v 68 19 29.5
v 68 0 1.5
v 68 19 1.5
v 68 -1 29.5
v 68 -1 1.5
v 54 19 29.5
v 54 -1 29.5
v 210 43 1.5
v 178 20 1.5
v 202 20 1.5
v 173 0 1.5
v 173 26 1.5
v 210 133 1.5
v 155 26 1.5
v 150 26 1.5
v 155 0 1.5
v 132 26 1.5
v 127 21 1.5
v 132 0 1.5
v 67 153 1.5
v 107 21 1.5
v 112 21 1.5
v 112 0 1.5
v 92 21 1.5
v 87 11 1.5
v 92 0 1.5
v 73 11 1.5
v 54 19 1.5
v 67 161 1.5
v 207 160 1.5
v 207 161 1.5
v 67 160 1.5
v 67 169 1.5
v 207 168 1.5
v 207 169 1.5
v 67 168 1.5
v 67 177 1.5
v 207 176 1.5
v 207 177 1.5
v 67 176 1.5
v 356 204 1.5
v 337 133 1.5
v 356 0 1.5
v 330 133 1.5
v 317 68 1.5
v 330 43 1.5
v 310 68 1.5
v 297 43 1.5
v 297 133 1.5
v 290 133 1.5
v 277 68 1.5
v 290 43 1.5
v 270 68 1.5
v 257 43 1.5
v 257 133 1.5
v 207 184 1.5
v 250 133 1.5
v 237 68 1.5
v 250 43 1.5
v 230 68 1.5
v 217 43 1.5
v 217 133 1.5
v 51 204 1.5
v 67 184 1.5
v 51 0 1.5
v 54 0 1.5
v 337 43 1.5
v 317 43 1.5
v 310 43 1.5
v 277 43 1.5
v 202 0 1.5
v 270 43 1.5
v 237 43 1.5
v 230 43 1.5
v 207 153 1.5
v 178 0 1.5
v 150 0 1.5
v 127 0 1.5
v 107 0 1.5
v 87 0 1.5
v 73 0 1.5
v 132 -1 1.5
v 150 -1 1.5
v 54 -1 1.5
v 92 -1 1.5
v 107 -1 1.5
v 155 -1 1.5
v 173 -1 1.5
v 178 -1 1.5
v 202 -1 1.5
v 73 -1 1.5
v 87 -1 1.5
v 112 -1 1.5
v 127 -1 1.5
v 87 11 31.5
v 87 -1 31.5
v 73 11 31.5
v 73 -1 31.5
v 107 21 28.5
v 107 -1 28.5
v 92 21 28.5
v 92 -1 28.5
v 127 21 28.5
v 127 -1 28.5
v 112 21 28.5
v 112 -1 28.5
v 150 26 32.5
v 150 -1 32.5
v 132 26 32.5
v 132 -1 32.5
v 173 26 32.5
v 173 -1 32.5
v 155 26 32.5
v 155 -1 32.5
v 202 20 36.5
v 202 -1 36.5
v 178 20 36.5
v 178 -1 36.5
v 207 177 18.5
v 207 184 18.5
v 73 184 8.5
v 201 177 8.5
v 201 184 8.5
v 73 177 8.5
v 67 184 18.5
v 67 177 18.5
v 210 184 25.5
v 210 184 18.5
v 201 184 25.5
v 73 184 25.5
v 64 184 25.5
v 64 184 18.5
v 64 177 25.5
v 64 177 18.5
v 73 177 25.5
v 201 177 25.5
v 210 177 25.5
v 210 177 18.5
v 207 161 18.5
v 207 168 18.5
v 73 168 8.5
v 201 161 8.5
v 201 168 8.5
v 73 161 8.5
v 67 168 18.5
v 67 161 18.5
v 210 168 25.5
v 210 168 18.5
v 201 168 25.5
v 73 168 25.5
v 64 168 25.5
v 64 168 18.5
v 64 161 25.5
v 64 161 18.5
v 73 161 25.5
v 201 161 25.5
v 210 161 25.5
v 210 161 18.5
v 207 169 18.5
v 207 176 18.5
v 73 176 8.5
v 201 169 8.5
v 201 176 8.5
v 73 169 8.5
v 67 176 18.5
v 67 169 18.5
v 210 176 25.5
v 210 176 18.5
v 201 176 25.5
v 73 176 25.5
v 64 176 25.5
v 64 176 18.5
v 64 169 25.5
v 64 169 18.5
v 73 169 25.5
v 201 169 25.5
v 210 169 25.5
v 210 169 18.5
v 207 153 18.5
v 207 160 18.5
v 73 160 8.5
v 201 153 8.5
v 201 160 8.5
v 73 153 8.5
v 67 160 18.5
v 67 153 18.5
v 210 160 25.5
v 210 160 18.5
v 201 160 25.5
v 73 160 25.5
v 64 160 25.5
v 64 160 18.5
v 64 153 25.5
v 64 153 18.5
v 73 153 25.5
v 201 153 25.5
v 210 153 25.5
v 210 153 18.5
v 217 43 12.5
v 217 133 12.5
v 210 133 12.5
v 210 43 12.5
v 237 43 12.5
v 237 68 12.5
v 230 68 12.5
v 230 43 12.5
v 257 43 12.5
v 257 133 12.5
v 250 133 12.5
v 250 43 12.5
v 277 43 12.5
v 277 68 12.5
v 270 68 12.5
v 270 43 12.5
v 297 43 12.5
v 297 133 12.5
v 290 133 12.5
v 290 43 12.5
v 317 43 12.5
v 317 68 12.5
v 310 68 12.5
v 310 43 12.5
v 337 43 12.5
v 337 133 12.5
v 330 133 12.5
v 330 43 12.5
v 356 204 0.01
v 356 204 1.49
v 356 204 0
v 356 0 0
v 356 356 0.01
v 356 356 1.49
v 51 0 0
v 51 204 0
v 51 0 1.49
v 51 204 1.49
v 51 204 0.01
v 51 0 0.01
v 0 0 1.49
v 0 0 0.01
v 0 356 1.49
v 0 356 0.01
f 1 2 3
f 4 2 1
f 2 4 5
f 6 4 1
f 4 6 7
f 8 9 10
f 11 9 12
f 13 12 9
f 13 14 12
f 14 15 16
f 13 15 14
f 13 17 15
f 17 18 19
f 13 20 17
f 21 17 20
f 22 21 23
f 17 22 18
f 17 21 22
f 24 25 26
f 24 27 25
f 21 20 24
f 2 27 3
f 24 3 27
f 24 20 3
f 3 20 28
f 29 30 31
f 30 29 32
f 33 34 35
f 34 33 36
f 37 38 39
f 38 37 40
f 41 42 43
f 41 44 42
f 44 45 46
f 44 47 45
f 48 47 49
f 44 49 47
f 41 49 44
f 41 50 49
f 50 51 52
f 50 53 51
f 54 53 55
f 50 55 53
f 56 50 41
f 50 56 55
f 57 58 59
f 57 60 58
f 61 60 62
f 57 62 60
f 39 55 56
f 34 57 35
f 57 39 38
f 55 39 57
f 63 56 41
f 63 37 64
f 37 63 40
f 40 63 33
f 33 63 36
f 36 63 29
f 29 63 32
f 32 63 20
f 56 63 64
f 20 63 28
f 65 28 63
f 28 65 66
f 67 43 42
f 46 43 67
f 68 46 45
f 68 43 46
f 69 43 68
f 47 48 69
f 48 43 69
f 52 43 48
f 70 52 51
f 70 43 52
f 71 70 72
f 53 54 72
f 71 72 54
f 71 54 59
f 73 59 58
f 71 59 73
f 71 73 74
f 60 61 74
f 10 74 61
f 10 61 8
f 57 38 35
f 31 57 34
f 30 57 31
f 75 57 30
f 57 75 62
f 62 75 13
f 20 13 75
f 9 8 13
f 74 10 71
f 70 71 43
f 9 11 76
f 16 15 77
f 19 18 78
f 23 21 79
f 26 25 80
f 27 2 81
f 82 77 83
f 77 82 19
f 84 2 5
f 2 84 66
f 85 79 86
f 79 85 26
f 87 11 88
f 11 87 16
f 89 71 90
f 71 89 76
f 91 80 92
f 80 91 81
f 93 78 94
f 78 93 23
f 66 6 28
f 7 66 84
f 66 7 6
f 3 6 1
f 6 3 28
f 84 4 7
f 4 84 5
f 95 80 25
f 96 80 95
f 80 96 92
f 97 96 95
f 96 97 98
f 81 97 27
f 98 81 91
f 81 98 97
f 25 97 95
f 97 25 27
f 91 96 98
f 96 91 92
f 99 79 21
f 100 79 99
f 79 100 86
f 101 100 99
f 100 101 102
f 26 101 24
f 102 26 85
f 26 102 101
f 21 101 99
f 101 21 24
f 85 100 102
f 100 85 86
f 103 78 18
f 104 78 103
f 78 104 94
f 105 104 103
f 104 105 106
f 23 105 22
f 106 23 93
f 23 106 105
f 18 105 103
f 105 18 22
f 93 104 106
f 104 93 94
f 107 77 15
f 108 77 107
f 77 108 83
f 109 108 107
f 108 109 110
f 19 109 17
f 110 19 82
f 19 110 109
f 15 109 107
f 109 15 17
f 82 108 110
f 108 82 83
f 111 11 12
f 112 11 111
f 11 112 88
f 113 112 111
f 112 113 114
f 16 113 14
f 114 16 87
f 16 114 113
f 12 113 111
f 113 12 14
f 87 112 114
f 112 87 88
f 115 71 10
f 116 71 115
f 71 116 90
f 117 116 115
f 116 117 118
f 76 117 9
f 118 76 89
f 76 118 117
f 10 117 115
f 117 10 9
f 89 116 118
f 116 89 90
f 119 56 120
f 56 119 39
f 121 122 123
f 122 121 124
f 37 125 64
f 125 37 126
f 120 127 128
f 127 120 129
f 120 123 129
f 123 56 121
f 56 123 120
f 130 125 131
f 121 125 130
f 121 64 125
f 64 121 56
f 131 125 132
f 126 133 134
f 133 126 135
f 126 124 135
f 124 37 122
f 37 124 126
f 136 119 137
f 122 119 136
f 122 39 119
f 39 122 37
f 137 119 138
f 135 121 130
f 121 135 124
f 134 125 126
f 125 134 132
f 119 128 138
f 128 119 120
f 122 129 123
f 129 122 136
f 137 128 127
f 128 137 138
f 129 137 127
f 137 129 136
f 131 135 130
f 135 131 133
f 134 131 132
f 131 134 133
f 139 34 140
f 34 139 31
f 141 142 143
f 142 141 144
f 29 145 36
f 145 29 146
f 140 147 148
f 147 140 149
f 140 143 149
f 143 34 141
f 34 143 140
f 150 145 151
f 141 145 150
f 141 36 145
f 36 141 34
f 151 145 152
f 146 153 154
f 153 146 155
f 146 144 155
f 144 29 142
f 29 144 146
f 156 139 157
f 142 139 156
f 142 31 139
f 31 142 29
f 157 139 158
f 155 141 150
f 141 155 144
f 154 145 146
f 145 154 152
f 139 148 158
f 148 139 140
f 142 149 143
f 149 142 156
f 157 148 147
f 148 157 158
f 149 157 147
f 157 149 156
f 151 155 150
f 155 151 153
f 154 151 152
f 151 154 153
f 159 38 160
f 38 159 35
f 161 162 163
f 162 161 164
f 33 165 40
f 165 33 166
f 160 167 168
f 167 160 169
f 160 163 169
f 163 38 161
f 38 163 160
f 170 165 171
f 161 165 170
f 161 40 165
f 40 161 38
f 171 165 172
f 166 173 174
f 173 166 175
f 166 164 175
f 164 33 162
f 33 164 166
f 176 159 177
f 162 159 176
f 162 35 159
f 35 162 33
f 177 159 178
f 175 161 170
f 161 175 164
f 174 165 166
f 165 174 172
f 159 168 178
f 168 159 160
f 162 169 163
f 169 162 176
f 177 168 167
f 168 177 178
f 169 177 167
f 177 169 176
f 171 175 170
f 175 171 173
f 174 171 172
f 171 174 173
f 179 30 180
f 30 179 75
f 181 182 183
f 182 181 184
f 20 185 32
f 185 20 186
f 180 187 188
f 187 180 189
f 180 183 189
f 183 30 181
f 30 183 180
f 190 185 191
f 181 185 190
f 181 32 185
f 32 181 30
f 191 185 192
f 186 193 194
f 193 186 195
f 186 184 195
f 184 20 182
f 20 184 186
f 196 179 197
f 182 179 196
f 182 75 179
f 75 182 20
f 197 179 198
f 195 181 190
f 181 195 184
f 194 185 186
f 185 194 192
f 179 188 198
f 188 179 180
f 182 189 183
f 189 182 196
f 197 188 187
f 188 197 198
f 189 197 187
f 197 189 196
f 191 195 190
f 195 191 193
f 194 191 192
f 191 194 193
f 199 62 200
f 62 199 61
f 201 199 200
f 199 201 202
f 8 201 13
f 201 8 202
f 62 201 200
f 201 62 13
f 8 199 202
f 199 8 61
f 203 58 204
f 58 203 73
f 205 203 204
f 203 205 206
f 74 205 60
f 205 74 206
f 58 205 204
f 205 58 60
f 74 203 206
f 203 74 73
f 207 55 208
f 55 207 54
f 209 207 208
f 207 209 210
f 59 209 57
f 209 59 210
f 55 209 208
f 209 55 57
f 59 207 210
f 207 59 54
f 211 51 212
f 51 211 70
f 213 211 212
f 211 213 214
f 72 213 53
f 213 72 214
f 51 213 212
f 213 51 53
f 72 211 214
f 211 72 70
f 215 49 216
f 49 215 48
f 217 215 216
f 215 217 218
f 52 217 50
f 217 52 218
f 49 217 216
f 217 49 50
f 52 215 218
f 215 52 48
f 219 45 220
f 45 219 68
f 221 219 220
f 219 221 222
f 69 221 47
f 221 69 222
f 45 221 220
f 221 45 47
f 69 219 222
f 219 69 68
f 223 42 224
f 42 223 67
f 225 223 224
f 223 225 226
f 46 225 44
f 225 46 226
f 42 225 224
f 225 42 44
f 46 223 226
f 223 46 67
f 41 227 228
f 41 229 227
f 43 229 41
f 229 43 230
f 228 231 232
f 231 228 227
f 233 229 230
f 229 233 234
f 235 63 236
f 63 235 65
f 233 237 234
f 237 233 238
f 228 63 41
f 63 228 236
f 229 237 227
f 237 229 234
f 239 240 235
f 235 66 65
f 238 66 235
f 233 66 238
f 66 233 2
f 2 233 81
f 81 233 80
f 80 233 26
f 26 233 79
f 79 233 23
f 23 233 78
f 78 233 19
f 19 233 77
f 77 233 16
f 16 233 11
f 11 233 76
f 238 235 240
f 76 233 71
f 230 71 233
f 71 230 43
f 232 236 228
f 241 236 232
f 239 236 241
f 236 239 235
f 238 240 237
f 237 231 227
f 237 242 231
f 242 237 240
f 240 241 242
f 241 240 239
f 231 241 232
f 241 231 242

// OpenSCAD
// ATX motherboard.

// Constants:
OX = 0.01;
pcbX = 305;
pcbY = 204;
pcbZ = 1.5;
wtxX = 356;
wtxY = 356;
ramX = 140;
ramY = 7;
ramZ = 7;

// Colors:
pcbColor = [56/255, 107/255, 172/255];
wtxColor = [100/255, 100/255, 255/255, 0.3];
metalColor = [255/255, 255/255, 255/255];
ram1Color = [238/255, 51/255, 41/255];
ram2Color = [252/255, 224/255, 57/255];
darkColor = [64/255, 64/255, 64/255];

// Modules:
module ramSlot(baseColor) {
    color(baseColor) {
        cube([140, ramY, ramZ]);
        cube([6, ramY, 17]);
        translate([ramX - 6, 0, 0]) cube([6, ramY, 17]);
    }
    color(metalColor) {
        translate([ramX - 6, 0, 17]) cube([9, ramY, 7]);
    }
    color(metalColor) {
        translate([-3, 0, 17]) cube([9, ramY, 7]);
    }
}

module pcie1() {
    color(darkColor) cube([ramY, 25, 11]);
}

module pcie16() {
    color(darkColor) cube([ramY, 90, 11]);
}

module motherboard() {
    // PCB:
	translate([wtxX - pcbX, 0, 0]) {
		color(pcbColor) cube([pcbX, pcbY, pcbZ]);
		translate([0, 0, pcbZ]) { // Place on board.

		// Periphery:
		color(metalColor) {
			translate([3, -1, 0]) {
				cube([14, 20, 28]);
				translate([14+5, 0, 0]) cube([14, 12, 30]);
				translate([(19)+14+5, 0, 0]) cube([15, 22, 27]);
				translate([(38)+15+5, 0, 0]) cube([15, 22, 27]);
				translate([(58)+15+5, 0, 0]) cube([18, 27, 31]);
				translate([(78)+18+5, 0, 0]) cube([18, 27, 31]);
				translate([(101)+18+5, 0, 0]) cube([24, 21, 35]);
			}
		}

		// RAM:
		translate([16, pcbY - 27, 0]) ramSlot(ram1Color);
		translate([16, pcbY - 27 - 2 * (ramY + 1), 0]) ramSlot(ram1Color);
		translate([16, pcbY - 27 - 1 * (ramY + 1), 0]) ramSlot(ram2Color);
		translate([16, pcbY - 27 - 3 * (ramY + 1), 0]) ramSlot(ram2Color);

		translate([159, 43, 0]) pcie16();
		translate([159 + 20 * 1, 43, 0]) pcie1();
		translate([159 + 20 * 2, 43, 0]) pcie16();
		translate([159 + 20 * 3, 43, 0]) pcie1();
		translate([159 + 20 * 4, 43, 0]) pcie16();
		translate([159 + 20 * 5, 43, 0]) pcie1();
		translate([159 + 20 * 6, 43, 0]) pcie16();

		}
	}
	// WTX preview:
	color(wtxColor) translate([0, 0, OX]) cube([wtxX, wtxY, pcbZ - 2 * OX]);
}

motherboard();
